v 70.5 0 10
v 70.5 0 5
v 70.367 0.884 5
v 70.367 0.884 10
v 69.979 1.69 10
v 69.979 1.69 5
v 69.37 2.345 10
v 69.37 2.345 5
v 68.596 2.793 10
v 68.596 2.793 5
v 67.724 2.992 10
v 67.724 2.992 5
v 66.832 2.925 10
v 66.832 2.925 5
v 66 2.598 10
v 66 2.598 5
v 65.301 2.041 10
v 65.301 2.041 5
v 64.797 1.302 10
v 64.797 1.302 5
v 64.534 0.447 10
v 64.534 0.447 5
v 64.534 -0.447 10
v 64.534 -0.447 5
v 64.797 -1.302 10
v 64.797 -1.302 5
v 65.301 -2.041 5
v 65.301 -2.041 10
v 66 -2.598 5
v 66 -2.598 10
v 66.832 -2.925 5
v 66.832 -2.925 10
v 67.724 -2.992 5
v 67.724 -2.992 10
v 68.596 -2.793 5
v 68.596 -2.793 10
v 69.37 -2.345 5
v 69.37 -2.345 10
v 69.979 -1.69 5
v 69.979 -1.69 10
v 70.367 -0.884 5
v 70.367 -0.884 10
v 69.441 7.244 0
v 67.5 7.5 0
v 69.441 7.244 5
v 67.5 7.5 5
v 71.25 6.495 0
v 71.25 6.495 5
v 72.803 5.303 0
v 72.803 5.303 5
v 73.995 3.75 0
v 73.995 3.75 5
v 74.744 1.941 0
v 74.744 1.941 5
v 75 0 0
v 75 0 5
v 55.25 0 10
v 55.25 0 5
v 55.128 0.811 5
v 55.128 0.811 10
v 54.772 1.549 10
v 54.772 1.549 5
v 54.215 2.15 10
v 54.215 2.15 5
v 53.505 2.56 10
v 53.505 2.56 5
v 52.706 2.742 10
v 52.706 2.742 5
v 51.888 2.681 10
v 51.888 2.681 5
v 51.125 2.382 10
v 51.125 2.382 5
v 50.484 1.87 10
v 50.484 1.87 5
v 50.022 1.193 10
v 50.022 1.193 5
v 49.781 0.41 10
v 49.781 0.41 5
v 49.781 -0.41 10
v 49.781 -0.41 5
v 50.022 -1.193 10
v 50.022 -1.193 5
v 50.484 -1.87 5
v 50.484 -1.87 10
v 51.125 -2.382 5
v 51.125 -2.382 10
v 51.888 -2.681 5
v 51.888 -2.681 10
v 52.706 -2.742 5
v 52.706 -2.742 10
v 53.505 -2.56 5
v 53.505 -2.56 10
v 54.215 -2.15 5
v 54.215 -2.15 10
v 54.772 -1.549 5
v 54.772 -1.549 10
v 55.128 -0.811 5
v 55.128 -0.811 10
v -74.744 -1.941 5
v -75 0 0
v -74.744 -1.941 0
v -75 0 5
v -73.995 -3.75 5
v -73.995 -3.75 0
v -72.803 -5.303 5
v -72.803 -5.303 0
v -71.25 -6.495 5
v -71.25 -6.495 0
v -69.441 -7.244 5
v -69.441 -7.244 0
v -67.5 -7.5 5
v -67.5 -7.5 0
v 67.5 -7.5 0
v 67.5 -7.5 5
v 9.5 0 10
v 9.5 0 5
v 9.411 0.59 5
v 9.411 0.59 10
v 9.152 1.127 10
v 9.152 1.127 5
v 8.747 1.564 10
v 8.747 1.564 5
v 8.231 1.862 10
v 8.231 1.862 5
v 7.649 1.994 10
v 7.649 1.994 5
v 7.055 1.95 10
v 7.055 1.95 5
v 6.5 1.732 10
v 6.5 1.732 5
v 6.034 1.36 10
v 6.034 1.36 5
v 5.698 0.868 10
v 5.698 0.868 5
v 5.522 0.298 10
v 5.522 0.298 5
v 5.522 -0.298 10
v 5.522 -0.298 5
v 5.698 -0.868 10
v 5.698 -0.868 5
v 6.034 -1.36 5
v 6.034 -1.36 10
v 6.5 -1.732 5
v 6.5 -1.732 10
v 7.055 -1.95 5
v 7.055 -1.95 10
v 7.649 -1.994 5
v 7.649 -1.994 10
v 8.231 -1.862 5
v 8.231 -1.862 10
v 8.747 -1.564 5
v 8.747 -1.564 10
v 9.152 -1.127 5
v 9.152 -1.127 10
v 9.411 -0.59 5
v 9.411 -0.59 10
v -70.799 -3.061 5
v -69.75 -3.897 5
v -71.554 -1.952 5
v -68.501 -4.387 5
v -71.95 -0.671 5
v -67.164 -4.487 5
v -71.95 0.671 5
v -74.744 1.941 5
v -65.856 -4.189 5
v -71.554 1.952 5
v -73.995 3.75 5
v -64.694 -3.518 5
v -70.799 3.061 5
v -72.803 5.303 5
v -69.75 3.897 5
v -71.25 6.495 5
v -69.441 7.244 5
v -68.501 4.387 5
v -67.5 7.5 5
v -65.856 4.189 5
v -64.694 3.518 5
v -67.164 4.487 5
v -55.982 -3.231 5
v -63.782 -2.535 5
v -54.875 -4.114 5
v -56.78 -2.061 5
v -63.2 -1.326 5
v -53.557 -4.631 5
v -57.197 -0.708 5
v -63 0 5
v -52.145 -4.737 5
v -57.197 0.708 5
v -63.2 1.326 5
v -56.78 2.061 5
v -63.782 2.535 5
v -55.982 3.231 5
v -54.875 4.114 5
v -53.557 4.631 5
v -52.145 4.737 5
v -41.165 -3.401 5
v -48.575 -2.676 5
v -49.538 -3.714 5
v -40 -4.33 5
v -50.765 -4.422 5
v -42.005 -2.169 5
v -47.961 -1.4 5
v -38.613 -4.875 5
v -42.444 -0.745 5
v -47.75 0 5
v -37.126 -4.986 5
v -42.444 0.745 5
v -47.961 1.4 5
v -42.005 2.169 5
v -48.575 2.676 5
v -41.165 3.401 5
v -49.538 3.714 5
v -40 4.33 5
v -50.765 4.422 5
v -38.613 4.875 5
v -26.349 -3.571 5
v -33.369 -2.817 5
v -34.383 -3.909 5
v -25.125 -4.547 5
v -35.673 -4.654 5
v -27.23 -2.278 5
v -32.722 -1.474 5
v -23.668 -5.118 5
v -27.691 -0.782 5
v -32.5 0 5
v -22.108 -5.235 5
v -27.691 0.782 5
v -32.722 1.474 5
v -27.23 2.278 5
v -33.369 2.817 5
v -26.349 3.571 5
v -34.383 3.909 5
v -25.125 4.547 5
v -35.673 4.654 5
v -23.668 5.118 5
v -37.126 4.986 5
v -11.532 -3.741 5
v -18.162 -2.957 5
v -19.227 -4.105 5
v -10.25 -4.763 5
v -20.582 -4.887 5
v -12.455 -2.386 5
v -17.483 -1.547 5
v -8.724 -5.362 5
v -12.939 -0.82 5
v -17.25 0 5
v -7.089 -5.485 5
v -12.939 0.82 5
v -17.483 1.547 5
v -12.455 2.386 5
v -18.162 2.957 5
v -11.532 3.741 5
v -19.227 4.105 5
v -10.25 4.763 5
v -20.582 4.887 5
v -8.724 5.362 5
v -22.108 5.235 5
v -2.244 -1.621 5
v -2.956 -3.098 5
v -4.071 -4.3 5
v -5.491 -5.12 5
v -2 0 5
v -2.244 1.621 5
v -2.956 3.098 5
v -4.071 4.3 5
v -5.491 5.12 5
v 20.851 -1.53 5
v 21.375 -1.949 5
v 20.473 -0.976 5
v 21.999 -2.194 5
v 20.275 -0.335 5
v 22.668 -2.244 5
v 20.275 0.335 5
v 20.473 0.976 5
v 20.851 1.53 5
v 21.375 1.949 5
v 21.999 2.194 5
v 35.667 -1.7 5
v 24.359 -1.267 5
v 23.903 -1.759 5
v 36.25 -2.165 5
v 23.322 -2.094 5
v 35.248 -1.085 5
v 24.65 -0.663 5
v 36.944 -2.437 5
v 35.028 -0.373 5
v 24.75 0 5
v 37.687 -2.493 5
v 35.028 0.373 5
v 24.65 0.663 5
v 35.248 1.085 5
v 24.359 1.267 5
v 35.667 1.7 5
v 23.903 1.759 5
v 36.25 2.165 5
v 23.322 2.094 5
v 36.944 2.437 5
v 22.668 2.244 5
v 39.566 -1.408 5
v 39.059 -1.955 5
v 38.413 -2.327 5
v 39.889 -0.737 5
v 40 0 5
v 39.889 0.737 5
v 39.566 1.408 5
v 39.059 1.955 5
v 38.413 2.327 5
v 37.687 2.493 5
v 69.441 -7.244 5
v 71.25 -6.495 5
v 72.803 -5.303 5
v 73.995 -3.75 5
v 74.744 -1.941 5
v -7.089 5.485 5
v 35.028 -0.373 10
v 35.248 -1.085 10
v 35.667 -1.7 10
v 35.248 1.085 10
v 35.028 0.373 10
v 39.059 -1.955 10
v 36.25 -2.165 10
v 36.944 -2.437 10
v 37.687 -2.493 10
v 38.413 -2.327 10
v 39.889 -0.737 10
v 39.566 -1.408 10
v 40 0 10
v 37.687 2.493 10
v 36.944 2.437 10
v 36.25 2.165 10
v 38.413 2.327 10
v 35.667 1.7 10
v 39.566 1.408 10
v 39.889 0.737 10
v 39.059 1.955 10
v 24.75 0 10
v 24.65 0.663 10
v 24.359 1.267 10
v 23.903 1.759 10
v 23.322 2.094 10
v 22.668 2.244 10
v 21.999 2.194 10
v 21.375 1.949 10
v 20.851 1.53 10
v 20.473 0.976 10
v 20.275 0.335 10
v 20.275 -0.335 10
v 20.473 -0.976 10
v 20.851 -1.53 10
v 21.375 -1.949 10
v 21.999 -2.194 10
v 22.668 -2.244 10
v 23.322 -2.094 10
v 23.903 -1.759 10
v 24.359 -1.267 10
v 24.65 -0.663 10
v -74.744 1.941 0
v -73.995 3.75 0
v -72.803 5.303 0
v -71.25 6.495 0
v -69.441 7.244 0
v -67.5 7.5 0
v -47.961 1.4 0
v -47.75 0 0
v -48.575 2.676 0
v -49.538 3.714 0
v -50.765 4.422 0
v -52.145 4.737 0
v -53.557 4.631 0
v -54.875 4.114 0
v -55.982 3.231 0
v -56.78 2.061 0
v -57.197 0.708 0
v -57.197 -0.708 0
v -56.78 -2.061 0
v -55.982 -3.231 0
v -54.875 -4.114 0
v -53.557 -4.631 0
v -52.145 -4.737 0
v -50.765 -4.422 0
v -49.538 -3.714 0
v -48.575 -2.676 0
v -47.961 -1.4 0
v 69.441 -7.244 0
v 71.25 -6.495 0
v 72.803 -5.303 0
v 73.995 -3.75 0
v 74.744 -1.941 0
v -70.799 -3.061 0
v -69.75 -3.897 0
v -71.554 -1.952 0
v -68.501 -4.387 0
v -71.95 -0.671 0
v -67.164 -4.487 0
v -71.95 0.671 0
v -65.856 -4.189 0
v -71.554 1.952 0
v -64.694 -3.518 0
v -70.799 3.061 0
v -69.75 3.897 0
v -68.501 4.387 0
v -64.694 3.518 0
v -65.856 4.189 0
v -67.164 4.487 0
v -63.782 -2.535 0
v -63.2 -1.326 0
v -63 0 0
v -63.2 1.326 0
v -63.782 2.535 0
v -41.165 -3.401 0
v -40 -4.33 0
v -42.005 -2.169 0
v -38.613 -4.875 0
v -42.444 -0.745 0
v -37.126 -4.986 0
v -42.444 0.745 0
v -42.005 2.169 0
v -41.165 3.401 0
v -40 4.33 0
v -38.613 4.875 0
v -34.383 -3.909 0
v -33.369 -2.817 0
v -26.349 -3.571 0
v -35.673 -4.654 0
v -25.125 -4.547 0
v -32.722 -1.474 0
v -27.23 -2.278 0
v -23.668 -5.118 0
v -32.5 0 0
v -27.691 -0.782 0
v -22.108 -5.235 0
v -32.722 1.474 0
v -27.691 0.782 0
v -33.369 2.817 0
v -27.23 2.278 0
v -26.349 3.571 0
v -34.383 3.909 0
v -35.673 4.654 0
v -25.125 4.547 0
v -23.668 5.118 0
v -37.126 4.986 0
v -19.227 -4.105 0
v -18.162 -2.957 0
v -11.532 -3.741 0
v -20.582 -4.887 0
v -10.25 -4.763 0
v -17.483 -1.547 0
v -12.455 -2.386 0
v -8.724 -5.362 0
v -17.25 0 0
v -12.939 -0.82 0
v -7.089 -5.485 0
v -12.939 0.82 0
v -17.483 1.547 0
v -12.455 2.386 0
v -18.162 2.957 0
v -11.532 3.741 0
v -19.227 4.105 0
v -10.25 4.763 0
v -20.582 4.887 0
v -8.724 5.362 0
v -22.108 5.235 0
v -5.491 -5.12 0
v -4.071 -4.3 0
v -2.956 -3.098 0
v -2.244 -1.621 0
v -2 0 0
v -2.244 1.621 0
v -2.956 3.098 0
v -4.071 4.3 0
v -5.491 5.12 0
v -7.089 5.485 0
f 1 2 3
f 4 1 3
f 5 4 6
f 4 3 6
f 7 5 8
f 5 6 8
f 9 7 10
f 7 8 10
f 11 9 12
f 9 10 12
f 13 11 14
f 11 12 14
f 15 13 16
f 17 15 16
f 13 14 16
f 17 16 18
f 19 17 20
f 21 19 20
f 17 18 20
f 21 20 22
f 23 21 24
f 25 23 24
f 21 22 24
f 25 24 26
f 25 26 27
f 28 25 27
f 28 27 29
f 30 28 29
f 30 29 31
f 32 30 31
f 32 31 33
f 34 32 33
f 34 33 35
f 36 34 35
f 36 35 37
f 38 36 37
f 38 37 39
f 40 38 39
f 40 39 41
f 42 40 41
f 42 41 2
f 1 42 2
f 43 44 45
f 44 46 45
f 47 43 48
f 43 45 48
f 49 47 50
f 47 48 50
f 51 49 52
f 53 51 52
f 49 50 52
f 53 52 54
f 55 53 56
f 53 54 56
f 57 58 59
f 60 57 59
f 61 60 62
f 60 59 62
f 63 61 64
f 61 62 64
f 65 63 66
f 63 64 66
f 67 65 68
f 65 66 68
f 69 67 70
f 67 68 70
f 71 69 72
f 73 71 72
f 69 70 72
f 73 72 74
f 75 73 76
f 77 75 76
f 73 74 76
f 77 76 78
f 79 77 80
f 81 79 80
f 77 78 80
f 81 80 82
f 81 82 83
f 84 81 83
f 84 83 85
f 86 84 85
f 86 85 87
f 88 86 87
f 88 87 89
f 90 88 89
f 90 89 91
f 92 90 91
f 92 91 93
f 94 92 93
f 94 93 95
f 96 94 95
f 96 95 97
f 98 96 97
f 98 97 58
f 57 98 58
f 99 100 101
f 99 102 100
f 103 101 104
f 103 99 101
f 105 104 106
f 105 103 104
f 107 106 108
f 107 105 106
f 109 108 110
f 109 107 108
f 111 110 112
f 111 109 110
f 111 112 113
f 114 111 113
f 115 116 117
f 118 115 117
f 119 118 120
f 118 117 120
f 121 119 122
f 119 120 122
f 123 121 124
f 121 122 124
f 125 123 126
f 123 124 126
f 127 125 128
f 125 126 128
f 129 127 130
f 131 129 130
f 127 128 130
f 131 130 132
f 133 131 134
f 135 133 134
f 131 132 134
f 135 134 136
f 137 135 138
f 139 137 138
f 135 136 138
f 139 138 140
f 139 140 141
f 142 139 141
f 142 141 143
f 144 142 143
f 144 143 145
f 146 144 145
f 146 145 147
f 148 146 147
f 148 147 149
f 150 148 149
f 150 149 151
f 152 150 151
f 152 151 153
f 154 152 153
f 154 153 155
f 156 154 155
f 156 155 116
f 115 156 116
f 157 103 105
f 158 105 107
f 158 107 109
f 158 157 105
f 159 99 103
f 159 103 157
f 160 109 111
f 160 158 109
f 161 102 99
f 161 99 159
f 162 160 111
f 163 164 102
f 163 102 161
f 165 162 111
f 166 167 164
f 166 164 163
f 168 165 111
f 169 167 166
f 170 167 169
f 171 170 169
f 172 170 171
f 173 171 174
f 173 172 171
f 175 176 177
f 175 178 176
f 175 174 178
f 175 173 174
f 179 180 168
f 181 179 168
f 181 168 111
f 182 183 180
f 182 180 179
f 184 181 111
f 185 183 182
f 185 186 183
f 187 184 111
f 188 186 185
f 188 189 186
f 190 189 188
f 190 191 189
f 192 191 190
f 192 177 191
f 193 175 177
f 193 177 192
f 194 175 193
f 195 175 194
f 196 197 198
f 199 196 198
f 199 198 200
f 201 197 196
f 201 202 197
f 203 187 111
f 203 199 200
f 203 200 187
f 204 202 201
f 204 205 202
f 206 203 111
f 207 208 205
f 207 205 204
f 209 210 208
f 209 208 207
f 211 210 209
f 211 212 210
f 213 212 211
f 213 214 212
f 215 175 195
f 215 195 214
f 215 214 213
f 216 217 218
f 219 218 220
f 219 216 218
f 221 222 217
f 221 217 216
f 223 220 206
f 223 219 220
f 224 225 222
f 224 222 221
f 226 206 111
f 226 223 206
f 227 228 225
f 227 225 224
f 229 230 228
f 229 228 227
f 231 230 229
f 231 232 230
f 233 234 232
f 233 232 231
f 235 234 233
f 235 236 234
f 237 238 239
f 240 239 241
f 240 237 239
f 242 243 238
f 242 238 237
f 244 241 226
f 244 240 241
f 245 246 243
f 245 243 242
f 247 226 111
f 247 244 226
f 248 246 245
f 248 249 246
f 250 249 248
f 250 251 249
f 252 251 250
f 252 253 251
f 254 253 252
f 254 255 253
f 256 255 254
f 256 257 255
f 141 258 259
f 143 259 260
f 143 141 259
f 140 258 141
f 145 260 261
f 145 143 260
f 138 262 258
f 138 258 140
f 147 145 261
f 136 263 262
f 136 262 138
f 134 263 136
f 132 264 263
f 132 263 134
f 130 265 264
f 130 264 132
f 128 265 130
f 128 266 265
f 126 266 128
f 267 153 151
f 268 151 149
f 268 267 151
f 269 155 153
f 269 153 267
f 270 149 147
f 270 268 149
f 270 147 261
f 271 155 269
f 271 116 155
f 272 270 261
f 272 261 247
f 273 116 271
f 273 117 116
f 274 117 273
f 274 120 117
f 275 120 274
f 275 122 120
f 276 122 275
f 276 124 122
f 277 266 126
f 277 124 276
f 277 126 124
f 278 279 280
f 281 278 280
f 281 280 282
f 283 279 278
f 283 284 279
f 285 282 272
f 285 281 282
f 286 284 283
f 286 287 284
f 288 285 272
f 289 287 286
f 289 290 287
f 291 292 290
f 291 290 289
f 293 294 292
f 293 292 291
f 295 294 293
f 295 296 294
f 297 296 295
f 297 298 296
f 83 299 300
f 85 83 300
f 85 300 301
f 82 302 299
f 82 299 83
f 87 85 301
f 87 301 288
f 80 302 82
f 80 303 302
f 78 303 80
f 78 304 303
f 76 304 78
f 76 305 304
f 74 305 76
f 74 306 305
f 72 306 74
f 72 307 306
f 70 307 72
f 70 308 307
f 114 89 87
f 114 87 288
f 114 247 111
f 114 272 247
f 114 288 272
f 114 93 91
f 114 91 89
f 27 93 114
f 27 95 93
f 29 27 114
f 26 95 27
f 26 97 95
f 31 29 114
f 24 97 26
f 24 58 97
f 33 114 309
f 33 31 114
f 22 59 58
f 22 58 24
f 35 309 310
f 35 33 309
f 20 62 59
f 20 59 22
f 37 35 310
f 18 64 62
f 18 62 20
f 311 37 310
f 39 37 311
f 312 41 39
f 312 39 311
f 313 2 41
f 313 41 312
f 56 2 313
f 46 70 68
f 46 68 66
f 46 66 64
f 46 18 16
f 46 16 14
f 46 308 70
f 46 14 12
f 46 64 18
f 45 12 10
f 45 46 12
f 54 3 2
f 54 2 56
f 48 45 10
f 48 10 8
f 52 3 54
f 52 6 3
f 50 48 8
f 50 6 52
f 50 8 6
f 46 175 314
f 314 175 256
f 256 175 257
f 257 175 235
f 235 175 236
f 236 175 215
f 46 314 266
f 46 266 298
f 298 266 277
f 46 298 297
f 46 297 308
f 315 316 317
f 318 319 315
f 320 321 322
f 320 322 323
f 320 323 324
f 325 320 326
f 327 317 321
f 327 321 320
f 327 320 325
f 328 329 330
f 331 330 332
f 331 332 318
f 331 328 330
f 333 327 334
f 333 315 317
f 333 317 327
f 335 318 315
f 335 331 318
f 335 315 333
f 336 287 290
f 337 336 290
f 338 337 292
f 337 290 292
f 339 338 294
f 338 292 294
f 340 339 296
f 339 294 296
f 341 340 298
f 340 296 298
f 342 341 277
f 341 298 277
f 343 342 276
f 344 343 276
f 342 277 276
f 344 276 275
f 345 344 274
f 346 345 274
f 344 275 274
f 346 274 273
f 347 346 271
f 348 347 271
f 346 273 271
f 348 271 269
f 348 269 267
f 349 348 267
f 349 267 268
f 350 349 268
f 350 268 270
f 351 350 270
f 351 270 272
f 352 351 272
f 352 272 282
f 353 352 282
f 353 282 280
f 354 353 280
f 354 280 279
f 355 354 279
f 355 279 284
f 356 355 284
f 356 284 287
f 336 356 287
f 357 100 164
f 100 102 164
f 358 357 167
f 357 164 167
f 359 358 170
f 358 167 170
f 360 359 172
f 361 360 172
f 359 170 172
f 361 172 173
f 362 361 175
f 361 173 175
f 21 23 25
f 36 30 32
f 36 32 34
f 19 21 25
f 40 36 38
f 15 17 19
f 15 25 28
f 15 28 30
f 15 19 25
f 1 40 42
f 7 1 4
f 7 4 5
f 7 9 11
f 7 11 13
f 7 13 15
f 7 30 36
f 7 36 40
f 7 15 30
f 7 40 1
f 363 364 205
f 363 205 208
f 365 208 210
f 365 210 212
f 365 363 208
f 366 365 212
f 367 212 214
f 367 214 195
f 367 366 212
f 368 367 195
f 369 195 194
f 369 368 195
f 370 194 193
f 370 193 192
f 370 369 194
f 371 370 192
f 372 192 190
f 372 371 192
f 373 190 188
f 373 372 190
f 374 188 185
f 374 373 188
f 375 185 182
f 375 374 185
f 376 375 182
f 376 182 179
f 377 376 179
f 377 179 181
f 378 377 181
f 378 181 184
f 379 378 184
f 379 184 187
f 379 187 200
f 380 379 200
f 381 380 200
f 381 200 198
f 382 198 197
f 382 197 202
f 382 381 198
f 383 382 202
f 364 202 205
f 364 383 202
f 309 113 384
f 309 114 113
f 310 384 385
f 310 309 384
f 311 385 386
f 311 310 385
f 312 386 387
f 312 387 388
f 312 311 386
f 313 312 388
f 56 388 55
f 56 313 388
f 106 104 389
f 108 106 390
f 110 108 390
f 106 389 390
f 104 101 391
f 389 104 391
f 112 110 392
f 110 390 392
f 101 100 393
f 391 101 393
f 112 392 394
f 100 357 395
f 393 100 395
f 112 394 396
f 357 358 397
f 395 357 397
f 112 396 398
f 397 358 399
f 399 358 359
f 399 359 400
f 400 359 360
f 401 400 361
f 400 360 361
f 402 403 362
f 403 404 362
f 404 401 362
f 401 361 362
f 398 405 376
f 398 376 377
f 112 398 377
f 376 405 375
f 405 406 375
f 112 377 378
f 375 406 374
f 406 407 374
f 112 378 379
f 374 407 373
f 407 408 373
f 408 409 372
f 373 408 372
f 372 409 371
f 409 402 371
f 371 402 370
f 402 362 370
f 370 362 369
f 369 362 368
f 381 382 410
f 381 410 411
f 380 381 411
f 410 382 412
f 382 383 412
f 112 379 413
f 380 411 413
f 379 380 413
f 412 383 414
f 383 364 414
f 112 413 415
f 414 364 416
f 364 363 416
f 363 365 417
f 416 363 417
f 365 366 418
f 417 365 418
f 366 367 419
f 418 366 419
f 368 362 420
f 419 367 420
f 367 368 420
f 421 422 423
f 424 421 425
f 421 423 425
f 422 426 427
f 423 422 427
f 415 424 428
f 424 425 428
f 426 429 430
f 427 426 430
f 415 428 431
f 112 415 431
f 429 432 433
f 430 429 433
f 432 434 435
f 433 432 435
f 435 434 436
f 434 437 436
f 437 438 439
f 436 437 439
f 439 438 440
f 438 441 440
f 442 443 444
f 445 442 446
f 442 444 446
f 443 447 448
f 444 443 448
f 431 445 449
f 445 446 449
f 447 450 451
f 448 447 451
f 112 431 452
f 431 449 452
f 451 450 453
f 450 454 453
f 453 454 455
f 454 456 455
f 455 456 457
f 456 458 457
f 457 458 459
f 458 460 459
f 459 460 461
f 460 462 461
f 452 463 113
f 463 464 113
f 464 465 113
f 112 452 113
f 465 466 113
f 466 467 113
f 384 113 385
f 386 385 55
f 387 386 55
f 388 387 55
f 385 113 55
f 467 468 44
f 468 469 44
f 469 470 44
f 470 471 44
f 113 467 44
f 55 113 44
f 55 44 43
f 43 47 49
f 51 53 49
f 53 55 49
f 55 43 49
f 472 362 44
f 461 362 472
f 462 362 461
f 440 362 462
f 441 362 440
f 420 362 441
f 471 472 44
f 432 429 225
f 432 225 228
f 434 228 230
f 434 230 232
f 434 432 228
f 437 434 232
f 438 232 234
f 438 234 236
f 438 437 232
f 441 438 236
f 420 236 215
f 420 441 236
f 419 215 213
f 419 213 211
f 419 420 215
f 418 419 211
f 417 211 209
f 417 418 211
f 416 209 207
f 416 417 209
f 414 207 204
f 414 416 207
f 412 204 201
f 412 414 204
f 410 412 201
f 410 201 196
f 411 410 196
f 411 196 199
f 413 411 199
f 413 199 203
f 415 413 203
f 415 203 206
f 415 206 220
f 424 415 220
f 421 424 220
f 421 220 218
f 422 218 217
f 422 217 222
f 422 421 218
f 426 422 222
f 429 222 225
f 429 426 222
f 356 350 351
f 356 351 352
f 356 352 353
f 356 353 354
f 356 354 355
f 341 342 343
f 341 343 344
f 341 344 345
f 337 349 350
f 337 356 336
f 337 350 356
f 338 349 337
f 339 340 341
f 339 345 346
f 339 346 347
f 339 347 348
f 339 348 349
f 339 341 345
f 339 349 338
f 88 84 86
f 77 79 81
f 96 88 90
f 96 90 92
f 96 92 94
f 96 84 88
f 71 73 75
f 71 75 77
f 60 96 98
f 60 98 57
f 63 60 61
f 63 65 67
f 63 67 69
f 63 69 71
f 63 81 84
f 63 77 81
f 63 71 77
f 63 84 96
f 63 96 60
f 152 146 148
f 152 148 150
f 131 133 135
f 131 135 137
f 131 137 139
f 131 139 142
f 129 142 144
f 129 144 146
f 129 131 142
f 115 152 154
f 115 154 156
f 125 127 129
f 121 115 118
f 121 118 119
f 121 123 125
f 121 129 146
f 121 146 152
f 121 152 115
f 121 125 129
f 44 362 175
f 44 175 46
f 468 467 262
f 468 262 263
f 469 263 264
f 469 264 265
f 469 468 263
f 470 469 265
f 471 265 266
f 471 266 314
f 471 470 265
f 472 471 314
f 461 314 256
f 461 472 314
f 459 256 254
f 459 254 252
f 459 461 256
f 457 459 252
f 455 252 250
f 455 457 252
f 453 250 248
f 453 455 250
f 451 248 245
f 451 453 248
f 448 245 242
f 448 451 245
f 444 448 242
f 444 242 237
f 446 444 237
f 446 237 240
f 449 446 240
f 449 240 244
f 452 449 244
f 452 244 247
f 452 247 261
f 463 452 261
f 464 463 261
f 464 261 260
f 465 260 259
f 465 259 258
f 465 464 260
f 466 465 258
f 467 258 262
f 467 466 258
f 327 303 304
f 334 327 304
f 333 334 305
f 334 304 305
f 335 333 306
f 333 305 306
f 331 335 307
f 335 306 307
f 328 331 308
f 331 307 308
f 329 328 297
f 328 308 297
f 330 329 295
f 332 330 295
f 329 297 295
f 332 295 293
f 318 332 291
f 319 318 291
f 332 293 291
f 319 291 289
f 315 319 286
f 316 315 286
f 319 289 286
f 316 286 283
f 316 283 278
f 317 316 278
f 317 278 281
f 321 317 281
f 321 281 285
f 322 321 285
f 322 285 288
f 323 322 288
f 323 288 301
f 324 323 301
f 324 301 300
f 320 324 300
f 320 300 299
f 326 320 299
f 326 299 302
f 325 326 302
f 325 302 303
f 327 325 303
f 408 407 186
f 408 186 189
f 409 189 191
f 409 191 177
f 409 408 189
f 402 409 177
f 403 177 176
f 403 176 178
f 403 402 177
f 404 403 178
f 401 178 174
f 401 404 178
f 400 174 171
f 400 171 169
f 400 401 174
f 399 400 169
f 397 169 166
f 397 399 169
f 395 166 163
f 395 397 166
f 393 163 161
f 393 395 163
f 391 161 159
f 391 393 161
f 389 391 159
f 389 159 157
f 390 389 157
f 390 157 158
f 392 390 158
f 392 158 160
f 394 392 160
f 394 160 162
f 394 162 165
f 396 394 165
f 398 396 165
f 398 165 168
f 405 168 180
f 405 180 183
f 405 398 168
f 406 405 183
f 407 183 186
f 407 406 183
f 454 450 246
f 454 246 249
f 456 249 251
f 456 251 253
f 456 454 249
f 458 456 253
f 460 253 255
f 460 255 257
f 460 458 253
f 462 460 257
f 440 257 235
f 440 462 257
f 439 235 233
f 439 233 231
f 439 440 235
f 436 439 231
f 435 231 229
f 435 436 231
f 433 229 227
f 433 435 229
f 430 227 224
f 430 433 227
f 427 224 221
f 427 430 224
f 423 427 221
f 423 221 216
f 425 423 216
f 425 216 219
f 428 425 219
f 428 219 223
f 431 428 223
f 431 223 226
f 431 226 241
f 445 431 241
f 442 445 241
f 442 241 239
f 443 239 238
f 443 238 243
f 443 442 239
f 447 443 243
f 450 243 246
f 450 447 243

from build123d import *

# Parameters (mm, degrees)
F0_W     = 150
F0_H     = 15
F0_R     = 4.5
F0_R_2   = 4.75
F0_R_3   = 5
F0_R_4   = 5.25
F0_R_5   = 5.5
F1_DEPTH = 5
F2_R     = 7.49999
F3_R     = 3
F3_R_2   = 2.5
F3_R_3   = 2.75
F3_R_4   = 2.25
F3_R_5   = 2
F4_DEPTH = 10


# Not quite as in the source:
# - a fillet or chamfer is up to 0.001 mm smaller than in the source, because OpenCascade refuses the exact size


with BuildPart() as f1:
    # F0 (on Top) → F1 (new body)
    with BuildSketch(Plane.XY):
        Rectangle(F0_W, F0_H)
        with Locations((-67.5, 0)):
            Circle(F0_R, mode=Mode.SUBTRACT)
        with Locations((-52.5, 0)):
            Circle(F0_R_2, mode=Mode.SUBTRACT)
        with Locations((-37.5, 0)):
            Circle(F0_R_3, mode=Mode.SUBTRACT)
        with Locations((-22.5, 0)):
            Circle(F0_R_4, mode=Mode.SUBTRACT)
        with Locations((-7.5, 0)):
            Circle(F0_R_5, mode=Mode.SUBTRACT)
    extrude(amount=F1_DEPTH)

    # F2 (radius 7.5 in the source; OpenCascade refuses exactly that, so slightly less here)
    f2_edges = [f1.edges().sort_by_distance(p)[0] for p in [
        (-75, -7.5, 2.5),
        (-75, 7.5, 2.5),
        (75, -7.5, 2.5),
        (75, 7.5, 2.5),
    ]]
    fillet(f2_edges, radius=F2_R)

    # F3 (on Top) → F4 (join)
    with BuildSketch(Plane.XY):
        with Locations((67.5, 0)):
            Circle(F3_R)
        with Locations((37.5, 0)):
            Circle(F3_R_2)
        with Locations((52.5, 0)):
            Circle(F3_R_3)
        with Locations((22.5, 0)):
            Circle(F3_R_4)
        with Locations((7.5, 0)):
            Circle(F3_R_5)
    extrude(amount=F4_DEPTH)


solid = f1.part
